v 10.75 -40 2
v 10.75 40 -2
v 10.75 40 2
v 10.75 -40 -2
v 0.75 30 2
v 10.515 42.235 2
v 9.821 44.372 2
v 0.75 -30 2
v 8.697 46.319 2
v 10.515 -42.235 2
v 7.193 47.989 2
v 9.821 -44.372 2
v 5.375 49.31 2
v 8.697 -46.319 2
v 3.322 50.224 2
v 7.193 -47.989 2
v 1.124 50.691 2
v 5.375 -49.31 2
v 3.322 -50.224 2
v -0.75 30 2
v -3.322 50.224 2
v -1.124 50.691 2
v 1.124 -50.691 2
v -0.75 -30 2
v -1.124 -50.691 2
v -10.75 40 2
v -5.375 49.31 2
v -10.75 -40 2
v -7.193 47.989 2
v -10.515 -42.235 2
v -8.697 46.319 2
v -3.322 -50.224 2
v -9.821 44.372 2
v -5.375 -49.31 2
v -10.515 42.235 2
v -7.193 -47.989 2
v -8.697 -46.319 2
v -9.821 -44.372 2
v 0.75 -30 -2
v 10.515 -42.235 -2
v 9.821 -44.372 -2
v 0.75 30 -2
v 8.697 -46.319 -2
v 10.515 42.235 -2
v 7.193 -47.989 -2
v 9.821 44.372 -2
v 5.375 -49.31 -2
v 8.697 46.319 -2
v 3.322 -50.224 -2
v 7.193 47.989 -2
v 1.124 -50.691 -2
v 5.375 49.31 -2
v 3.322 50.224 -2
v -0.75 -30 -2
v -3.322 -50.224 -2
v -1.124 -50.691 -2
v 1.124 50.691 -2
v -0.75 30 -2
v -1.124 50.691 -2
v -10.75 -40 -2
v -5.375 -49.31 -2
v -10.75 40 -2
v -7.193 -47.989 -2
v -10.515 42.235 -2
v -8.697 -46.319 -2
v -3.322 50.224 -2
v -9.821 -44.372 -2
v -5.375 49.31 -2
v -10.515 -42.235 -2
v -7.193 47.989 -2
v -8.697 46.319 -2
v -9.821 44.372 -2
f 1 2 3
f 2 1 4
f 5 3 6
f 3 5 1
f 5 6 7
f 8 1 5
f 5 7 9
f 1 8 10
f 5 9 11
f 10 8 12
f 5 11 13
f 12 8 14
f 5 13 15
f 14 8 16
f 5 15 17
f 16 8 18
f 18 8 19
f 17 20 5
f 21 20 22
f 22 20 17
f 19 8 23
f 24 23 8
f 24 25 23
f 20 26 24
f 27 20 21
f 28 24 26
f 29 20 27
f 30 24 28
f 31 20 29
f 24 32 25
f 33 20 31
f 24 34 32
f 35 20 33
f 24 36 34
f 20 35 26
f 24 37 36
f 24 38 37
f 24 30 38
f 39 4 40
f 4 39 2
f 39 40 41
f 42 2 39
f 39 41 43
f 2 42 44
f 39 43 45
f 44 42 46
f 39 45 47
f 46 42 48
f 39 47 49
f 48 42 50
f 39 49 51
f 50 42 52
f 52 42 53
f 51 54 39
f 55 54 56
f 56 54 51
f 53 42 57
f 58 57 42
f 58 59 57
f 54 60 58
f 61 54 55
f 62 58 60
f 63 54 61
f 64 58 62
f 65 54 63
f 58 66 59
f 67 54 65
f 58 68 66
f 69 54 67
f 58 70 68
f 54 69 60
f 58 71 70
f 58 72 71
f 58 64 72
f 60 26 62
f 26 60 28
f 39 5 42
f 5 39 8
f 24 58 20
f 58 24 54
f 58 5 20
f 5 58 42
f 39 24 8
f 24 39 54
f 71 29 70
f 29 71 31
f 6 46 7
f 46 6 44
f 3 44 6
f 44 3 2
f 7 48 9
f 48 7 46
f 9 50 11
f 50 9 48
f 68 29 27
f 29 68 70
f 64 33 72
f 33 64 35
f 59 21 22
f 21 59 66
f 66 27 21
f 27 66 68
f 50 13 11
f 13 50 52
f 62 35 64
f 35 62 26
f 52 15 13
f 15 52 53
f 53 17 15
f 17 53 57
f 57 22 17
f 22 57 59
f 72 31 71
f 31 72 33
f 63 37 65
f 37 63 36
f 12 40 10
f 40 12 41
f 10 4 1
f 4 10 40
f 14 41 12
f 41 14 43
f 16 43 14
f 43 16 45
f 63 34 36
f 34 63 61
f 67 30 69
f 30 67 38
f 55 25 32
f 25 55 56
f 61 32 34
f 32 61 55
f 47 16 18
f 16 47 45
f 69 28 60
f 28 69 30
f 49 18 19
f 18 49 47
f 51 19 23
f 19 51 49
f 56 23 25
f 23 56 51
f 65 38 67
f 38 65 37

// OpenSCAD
//!OpenSCAD

slot_length = 60;
slot_width = 1.5;
general_height = 4;
rim_width = 10;

union(){
  difference() {
    cube([(slot_width + rim_width * 2), (slot_length + rim_width * 2), general_height], center=true);

    cube([slot_width, slot_length, general_height], center=true);
  }
  translate([0, (slot_length / 2 + rim_width), 0]){
    difference() {
      cylinder(r1=(rim_width + slot_width / 2), r2=(rim_width + slot_width / 2), h=general_height, center=true);

      translate([-50, -100, -50]){
        cube([100, 100, 100], center=false);
      }
    }
  }
  translate([0, ((slot_length / 2 + rim_width) * -1), 0]){
    mirror([0,1,0]){
      difference() {
        cylinder(r1=(rim_width + slot_width / 2), r2=(rim_width + slot_width / 2), h=general_height, center=true);

        translate([-50, -100, -50]){
          cube([100, 100, 100], center=false);
        }
      }
    }
  }
}
